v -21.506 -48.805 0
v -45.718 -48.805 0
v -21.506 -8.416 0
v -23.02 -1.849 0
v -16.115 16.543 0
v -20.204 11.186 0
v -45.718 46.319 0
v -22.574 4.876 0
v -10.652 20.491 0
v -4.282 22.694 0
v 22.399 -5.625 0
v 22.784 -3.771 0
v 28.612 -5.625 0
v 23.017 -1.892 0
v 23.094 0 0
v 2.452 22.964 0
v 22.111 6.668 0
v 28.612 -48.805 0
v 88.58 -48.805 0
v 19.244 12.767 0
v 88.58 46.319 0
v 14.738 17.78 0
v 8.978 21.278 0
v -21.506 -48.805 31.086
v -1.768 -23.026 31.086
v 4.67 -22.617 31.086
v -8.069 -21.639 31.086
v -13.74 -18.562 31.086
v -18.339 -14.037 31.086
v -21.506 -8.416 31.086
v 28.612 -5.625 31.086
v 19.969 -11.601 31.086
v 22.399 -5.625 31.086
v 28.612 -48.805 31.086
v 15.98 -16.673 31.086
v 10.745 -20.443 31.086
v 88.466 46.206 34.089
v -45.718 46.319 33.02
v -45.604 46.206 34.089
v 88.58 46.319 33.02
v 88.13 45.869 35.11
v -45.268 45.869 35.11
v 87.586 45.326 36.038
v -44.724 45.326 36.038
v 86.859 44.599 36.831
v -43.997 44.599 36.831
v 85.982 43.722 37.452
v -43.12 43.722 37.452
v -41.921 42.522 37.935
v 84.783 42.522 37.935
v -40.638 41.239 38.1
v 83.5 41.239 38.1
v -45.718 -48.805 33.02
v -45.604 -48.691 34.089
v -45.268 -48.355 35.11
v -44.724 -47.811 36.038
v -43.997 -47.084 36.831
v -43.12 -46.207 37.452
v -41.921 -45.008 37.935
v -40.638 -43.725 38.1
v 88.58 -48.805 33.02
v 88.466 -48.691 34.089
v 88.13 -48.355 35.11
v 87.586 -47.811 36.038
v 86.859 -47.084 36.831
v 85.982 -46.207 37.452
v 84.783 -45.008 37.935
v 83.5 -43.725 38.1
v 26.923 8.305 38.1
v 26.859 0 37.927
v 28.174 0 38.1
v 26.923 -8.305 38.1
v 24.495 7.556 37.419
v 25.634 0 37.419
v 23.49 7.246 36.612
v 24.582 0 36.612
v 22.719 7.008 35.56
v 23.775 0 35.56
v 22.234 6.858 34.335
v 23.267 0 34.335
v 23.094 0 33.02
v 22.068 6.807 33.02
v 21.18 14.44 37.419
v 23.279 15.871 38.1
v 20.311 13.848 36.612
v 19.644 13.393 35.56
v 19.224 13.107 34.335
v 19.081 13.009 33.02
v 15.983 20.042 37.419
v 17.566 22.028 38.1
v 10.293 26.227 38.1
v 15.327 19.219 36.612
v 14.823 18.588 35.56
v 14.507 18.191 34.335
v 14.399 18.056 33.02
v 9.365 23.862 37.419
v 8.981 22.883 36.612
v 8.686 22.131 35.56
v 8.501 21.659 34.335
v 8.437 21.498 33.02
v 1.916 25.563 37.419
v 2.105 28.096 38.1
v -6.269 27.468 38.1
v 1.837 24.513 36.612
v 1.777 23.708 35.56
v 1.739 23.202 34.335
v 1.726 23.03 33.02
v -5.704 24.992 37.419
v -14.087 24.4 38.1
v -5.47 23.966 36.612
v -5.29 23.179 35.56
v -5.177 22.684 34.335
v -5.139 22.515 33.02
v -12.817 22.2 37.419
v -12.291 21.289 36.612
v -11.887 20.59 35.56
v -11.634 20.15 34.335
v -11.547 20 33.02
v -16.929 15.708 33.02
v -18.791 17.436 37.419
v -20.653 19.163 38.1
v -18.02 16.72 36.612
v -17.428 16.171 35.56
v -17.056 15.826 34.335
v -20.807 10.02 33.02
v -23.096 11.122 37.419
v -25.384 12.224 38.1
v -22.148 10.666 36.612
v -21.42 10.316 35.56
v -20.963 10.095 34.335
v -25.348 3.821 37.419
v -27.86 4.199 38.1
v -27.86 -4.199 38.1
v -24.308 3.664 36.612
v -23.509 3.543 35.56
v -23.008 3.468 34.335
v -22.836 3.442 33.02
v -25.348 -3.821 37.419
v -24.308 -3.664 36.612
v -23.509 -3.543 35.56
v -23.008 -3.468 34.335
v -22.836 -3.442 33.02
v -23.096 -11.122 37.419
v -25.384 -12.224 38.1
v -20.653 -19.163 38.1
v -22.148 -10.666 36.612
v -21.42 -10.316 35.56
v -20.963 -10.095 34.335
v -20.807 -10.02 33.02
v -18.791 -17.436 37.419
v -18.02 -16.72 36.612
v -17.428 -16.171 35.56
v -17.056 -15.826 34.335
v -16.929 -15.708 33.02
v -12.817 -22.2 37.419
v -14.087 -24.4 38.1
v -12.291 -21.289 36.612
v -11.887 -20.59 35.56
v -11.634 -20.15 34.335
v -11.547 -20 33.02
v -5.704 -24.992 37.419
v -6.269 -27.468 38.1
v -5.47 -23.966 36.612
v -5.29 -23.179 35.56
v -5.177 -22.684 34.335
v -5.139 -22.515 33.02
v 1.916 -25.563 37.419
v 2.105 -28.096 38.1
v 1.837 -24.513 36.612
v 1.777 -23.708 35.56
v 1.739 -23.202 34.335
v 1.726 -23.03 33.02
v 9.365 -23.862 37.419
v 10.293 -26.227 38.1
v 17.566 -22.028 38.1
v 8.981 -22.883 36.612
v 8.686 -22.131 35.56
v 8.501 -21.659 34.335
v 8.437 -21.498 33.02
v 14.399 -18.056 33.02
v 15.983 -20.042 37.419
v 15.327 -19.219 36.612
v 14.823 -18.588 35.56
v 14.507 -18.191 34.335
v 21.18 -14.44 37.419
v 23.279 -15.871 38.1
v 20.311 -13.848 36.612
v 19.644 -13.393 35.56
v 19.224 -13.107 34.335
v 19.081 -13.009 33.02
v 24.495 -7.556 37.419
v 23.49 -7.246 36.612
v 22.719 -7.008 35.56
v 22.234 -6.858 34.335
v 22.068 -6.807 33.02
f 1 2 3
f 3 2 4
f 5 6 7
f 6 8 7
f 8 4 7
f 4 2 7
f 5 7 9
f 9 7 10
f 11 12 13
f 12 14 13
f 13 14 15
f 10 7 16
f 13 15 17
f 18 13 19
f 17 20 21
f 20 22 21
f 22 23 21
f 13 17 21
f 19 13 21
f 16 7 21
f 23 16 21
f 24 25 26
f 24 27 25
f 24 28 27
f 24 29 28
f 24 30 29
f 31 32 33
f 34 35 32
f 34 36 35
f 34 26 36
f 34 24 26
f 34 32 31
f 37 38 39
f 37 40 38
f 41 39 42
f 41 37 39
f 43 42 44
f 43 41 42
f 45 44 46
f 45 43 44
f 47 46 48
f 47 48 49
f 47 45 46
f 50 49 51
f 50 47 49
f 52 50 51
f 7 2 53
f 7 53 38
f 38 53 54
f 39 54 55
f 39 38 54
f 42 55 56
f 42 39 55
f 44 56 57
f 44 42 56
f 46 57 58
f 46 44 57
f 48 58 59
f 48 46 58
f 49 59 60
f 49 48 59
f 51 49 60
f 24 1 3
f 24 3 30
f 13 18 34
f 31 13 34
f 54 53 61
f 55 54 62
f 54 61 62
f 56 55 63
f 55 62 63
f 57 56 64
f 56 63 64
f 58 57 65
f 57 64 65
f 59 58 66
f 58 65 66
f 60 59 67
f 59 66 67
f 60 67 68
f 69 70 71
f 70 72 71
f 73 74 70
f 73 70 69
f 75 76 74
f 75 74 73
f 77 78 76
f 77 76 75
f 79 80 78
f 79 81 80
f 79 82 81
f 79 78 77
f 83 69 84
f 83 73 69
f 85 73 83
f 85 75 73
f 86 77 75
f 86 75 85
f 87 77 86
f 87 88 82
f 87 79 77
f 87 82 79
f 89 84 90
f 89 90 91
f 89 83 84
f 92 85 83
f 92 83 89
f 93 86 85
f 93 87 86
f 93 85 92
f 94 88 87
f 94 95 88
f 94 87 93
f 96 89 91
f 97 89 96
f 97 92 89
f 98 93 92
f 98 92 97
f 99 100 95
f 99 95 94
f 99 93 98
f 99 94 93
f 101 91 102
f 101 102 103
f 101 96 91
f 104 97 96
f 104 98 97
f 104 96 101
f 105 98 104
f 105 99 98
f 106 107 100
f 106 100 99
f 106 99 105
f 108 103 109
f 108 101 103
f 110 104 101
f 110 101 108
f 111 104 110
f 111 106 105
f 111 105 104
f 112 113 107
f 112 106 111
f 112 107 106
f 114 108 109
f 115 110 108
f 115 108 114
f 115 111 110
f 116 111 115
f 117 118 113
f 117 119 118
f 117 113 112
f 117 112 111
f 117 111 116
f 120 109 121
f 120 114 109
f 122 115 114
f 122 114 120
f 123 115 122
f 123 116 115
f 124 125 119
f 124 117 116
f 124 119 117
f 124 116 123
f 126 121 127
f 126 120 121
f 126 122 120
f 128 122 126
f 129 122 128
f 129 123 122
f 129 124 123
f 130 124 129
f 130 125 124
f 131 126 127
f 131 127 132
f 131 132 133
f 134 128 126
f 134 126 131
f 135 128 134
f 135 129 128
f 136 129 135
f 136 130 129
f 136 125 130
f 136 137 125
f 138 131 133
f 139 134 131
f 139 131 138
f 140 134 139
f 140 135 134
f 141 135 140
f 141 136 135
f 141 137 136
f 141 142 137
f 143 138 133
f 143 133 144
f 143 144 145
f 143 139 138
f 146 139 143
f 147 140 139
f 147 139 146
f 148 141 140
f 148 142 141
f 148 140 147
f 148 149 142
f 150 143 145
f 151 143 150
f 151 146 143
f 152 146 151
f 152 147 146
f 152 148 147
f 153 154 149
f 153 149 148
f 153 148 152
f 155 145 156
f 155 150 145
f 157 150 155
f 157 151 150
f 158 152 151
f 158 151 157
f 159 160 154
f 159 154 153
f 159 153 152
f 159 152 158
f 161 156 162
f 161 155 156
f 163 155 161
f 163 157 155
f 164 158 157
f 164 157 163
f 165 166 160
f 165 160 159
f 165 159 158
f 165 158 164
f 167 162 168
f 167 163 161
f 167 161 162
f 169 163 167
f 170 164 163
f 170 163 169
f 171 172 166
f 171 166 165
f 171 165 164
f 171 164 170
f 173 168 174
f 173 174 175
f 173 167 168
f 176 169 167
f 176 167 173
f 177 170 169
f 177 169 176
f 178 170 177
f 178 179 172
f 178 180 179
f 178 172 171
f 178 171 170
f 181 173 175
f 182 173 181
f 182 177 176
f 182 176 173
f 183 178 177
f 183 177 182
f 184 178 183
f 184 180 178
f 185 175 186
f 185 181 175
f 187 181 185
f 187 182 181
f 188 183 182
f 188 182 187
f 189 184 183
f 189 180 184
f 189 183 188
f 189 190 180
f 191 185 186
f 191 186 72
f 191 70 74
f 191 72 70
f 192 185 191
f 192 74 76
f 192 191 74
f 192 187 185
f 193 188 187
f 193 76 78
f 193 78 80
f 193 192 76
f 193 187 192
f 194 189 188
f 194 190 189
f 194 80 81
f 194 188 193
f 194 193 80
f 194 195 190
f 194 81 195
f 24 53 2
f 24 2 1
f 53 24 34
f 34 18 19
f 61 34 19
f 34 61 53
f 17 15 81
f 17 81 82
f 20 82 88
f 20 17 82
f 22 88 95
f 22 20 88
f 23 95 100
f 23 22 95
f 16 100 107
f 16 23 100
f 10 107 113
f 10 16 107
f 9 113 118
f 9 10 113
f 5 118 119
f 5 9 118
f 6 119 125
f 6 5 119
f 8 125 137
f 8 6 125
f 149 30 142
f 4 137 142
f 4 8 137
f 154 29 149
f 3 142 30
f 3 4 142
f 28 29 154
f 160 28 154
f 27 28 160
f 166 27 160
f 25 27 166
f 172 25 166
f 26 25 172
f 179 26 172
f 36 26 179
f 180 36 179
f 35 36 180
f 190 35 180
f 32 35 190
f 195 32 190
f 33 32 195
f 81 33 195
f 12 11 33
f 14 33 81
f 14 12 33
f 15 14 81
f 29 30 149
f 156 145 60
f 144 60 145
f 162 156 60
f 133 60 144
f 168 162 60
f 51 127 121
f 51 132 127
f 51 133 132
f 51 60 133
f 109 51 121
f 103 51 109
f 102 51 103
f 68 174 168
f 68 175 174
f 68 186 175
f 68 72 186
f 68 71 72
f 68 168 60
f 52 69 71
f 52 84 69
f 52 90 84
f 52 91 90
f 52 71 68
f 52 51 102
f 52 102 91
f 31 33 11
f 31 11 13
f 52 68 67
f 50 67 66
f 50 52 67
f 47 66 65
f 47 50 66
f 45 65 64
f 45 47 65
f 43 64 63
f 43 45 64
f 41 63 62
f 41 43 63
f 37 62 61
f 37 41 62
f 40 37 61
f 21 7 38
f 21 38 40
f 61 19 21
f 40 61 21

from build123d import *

# Parameters (mm, degrees)
F1_W     = 134.2979371548
F1_H     = 95.1243713498
F1_R     = 23.0942820745
F2_DEPTH = 38.1
F3_W     = 50.118137151
F3_H     = 31.0858320445
F4_DEPTH = 43.18
F5_R     = 5.08


with BuildPart() as f2:
    # F1 (on face) → F2 (new body)
    with BuildSketch(Plane.XY):
        with Locations((21.4310362935, -1.2426972389)):
            Rectangle(F1_W, F1_H)
        Circle(F1_R, mode=Mode.SUBTRACT)
    extrude(amount=F2_DEPTH)

    # F3 (on face) → F4 (cut)
    with BuildSketch(Plane.XZ.offset(48.8048829138)):
        with Locations((3.5529956222, 15.5429160222)):
            Rectangle(F3_W, F3_H)
    extrude(amount=-F4_DEPTH, mode=Mode.SUBTRACT)

    # F5
    f5_edges = [f2.edges().sort_by_distance(p)[0] for p in [
        (21.431036, 46.319488, 38.1),
        (-45.717932, -1.242697, 38.1),
        (21.431036, -48.804883, 38.1),
        (88.580005, -1.242697, 38.1),
        (-23.094282, 0, 38.1),
    ]]
    fillet(f5_edges, radius=F5_R)


solid = f2.part
